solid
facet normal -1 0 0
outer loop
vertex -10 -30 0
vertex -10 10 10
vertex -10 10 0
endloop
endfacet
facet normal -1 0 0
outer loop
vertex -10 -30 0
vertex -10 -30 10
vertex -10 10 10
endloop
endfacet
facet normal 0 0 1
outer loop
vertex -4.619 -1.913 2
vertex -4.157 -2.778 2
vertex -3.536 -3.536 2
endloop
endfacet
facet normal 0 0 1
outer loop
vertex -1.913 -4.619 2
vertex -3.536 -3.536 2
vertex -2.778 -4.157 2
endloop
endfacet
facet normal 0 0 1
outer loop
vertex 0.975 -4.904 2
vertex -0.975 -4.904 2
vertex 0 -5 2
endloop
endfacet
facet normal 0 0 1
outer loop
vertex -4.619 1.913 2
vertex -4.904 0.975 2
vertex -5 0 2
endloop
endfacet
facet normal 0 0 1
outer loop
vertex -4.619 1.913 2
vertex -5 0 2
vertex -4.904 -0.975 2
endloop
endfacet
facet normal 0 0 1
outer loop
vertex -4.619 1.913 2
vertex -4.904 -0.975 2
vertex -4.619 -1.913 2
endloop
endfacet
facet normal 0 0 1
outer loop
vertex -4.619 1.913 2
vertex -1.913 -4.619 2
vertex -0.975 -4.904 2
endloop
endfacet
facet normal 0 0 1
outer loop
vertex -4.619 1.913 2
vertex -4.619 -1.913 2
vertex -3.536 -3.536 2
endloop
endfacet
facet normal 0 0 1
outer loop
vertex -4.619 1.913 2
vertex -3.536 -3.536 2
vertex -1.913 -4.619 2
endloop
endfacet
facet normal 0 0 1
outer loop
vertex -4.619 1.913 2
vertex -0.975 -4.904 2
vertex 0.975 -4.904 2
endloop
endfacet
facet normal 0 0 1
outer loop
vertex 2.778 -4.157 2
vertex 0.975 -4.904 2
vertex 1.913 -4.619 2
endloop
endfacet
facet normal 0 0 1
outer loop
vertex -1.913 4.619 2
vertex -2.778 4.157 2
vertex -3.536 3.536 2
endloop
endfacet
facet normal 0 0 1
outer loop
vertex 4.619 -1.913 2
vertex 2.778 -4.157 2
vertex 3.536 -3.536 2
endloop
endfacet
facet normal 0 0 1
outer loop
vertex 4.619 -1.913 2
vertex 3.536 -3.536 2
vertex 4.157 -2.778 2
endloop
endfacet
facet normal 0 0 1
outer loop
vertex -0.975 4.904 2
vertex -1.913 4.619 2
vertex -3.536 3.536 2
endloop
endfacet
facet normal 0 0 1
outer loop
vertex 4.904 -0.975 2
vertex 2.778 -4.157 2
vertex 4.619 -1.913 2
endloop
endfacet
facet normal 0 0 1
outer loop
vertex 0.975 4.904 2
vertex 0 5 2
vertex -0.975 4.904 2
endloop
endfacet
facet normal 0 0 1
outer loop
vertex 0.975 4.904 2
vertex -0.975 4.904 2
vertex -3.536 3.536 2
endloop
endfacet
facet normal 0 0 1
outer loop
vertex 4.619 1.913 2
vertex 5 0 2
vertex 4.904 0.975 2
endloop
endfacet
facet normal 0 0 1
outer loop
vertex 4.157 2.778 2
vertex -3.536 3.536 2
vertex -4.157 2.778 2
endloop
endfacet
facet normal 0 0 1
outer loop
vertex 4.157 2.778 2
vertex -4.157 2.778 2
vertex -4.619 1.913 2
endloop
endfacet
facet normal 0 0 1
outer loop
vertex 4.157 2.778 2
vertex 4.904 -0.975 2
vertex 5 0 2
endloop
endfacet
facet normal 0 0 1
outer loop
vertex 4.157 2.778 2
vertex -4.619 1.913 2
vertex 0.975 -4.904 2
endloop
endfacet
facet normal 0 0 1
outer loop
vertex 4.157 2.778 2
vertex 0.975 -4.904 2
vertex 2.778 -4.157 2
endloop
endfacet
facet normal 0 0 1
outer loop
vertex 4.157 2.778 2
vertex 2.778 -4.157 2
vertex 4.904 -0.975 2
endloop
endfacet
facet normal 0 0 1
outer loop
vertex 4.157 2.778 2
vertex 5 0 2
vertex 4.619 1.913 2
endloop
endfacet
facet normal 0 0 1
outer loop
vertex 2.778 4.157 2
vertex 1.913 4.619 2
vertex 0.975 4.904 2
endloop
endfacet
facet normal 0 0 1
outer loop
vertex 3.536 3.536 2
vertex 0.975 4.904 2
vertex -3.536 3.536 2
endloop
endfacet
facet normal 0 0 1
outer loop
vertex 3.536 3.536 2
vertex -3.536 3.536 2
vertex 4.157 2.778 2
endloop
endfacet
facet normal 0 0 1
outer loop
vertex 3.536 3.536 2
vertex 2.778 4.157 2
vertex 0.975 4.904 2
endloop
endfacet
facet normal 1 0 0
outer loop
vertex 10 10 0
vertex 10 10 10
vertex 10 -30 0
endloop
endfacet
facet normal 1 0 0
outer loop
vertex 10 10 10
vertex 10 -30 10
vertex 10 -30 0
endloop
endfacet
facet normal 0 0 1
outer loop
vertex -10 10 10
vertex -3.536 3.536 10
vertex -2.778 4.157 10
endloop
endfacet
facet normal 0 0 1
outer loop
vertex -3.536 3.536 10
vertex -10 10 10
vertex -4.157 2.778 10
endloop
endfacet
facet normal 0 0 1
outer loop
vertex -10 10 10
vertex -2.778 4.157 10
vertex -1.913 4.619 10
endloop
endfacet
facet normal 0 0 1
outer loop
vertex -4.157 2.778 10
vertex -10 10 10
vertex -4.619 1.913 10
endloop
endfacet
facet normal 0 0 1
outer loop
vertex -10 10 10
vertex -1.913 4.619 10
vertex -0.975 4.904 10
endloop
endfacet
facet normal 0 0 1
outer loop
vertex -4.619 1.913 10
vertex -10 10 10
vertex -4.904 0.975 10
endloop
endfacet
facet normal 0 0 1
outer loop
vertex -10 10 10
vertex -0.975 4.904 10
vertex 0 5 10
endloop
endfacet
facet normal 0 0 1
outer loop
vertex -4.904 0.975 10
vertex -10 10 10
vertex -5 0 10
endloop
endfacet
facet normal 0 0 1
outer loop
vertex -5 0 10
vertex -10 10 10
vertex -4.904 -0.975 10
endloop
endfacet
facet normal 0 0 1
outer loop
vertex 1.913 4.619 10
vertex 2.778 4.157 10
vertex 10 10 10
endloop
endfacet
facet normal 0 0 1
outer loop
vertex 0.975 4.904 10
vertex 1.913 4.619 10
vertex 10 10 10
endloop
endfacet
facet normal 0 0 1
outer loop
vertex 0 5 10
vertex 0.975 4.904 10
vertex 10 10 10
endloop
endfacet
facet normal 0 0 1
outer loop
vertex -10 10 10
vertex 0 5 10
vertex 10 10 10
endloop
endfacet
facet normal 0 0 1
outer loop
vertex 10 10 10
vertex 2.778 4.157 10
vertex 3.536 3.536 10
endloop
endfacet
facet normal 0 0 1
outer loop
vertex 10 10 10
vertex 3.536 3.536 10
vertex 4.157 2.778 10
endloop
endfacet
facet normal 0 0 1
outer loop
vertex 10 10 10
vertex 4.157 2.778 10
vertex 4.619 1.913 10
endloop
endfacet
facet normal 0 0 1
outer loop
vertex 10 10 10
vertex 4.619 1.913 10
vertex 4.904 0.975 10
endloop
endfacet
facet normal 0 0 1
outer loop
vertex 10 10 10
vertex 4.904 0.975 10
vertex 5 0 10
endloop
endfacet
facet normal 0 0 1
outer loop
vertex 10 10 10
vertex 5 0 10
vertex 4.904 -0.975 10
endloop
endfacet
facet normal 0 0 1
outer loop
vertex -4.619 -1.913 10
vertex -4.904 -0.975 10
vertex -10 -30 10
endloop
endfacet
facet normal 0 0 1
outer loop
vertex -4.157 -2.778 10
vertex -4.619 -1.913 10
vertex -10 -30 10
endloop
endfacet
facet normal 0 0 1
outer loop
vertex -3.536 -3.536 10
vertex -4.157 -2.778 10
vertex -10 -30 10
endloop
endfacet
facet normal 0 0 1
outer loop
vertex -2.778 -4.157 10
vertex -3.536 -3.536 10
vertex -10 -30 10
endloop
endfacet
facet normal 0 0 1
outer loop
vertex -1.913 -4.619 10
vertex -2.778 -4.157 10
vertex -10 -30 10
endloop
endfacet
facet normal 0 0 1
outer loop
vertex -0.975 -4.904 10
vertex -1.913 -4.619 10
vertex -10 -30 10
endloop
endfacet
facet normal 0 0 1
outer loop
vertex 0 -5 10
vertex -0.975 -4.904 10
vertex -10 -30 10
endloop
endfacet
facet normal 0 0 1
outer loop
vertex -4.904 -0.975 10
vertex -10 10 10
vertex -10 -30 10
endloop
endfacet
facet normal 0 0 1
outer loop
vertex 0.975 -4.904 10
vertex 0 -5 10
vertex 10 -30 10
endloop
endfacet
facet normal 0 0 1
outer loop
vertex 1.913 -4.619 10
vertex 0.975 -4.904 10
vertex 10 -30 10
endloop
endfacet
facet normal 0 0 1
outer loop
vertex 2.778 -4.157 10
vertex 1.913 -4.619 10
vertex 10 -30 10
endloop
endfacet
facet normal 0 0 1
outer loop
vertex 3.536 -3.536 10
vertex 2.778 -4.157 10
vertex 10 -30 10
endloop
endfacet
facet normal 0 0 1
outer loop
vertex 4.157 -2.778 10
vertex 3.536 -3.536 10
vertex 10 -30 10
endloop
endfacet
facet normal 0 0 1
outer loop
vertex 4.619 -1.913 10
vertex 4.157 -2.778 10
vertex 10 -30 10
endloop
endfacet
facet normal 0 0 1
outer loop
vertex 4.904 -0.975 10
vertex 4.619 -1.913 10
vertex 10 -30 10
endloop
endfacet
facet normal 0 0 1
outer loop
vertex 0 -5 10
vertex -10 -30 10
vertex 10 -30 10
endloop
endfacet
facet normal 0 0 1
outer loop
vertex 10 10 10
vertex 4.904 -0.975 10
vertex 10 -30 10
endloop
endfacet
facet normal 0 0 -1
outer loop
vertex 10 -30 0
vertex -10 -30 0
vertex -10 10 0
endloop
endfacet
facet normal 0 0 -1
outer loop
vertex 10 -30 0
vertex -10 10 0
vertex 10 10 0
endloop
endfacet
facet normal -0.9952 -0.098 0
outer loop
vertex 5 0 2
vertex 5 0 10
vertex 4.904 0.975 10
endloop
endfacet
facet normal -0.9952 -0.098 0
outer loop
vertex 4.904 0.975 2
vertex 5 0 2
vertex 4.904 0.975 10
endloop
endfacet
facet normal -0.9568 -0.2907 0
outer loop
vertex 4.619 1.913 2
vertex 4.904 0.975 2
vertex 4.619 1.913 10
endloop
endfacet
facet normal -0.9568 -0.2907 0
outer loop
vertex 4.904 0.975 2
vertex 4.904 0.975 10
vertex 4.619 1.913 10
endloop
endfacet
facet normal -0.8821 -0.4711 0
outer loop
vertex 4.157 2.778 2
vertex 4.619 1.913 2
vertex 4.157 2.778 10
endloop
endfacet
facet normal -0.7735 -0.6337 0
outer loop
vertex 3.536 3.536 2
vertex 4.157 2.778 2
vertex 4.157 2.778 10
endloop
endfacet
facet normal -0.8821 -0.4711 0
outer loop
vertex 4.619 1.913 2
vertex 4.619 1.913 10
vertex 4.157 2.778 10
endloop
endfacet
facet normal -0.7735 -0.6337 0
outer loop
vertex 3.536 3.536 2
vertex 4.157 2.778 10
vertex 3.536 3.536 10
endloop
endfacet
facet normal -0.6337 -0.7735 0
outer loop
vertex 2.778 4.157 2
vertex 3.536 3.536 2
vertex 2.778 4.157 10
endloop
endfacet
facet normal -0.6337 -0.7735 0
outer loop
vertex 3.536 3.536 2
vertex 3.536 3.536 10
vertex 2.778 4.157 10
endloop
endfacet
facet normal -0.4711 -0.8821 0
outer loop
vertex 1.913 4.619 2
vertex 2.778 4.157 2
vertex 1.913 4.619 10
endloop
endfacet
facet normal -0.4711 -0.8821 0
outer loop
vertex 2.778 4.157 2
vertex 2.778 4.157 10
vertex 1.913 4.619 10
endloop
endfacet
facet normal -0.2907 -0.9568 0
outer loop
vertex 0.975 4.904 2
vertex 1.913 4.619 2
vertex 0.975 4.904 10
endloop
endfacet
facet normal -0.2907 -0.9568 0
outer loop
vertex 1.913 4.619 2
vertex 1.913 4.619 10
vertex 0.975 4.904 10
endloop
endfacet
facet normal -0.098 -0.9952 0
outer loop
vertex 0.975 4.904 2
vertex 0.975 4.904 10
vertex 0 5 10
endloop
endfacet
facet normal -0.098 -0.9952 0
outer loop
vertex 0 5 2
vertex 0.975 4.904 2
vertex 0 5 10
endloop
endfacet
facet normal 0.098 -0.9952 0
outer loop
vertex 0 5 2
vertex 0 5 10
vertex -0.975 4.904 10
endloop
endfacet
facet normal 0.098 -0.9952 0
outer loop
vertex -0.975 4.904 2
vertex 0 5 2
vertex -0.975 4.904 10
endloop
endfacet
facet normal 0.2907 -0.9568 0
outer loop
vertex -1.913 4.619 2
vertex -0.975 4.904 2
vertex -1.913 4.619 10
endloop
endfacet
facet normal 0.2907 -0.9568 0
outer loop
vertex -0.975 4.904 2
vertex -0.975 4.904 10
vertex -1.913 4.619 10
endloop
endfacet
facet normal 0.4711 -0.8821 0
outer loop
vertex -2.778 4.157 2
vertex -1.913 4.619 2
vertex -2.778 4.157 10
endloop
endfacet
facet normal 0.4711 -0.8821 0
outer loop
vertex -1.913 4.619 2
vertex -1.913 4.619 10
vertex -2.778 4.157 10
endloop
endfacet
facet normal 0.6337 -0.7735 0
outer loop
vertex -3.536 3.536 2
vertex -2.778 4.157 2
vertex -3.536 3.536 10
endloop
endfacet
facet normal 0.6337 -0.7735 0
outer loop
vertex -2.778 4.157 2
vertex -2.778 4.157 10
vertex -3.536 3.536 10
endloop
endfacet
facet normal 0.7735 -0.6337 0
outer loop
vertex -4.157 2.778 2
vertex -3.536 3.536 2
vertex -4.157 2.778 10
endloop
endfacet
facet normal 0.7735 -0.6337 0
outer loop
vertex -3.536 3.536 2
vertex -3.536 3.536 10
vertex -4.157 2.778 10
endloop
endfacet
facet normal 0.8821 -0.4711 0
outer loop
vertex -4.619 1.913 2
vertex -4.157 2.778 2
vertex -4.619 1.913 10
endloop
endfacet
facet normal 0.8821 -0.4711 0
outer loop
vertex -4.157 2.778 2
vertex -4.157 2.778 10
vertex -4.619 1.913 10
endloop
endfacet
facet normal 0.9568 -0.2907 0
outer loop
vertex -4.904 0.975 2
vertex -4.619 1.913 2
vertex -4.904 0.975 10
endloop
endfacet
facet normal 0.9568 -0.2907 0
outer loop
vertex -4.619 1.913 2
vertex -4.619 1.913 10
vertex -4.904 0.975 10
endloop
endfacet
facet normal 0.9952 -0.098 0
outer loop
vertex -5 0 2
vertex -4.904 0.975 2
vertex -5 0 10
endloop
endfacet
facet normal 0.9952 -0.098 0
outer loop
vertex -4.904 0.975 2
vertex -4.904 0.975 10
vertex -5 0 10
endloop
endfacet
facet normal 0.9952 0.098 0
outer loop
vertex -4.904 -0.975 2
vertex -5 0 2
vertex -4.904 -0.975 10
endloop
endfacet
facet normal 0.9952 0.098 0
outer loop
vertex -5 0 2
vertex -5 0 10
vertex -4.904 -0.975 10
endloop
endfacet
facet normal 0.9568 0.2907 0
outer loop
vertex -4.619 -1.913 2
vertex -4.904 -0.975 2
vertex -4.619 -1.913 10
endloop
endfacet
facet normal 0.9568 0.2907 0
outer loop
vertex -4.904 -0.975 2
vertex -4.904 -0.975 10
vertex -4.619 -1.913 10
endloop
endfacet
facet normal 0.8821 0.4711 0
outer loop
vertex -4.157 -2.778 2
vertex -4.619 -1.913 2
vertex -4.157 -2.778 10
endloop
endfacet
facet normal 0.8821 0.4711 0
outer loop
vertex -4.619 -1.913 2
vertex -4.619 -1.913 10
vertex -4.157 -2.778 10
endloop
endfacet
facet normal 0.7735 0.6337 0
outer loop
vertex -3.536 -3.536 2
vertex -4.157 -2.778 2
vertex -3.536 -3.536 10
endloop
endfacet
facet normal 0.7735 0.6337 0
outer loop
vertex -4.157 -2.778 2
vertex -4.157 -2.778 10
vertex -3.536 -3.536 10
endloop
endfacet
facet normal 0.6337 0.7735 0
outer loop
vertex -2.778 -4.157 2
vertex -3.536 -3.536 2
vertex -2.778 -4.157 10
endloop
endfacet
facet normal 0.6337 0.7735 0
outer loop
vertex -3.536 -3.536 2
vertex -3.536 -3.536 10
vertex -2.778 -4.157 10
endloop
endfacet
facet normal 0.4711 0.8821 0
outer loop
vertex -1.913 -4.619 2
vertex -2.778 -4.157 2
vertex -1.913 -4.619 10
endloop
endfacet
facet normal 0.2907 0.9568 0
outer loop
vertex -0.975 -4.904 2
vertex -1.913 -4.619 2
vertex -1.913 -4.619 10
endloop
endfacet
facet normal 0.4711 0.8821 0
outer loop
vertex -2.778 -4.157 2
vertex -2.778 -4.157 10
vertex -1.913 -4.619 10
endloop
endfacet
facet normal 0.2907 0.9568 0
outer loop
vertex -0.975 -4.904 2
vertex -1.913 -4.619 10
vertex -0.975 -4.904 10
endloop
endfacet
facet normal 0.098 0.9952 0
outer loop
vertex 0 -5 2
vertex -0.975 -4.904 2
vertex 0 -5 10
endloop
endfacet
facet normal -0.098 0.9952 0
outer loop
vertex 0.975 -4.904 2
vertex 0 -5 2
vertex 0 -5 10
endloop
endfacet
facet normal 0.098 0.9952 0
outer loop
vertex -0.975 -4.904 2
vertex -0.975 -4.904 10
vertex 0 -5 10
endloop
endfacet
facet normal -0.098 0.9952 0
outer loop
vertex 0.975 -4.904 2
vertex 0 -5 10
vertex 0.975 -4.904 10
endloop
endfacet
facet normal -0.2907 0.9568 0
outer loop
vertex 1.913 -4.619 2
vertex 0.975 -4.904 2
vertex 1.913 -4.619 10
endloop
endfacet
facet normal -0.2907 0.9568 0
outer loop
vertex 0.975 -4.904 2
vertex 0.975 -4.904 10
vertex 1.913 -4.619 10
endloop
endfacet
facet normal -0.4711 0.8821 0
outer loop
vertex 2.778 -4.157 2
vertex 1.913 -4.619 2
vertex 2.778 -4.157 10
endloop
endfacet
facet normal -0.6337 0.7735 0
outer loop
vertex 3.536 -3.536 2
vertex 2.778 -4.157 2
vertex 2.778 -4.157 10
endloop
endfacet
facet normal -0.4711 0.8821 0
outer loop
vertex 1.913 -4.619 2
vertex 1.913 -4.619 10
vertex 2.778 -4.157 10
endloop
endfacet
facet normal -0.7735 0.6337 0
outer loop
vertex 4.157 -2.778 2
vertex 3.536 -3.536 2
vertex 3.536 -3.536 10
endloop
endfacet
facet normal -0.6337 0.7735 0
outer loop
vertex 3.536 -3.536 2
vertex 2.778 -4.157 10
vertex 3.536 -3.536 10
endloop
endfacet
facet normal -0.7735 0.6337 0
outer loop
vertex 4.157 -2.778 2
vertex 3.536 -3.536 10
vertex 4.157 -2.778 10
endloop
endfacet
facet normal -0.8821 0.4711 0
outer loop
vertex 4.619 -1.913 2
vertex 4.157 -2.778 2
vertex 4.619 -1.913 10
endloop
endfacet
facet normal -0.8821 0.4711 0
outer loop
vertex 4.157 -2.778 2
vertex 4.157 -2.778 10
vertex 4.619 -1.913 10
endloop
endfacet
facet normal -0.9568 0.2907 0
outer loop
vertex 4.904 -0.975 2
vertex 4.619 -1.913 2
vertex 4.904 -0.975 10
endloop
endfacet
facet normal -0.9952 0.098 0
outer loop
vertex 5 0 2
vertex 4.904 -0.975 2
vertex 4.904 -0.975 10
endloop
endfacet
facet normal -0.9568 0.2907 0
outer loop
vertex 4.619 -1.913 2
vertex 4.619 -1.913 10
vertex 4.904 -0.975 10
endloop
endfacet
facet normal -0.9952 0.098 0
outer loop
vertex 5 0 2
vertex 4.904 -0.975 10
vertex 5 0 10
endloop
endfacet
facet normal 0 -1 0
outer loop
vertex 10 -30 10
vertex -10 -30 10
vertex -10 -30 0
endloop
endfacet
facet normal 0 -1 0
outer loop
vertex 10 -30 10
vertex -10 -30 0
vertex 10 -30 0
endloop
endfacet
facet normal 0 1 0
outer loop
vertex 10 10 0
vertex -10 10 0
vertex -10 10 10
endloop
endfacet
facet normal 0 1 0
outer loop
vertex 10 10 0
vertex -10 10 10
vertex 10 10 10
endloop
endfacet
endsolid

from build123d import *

# Parameters (mm, degrees)
F0_W      = 20
F0_H      = 10
F1_DEPTH  = 30
F1_FACE_W = 20
F1_FACE_H = 10
F2_DEPTH  = 10
F4_R      = 5
F5_DEPTH  = 8


with BuildPart() as f1:
    # F0 (on Front) → F1 (new body)
    with BuildSketch(Plane.XZ):
        with Locations((0, 5)):
            Rectangle(F0_W, F0_H)
    extrude(amount=F1_DEPTH)

    # F1_face (on face) → F2 (join)
    with BuildSketch(Plane(origin=(0, 0, 5), x_dir=(1, 0, 0), z_dir=(0, 1, 0))):
        Rectangle(F1_FACE_W, F1_FACE_H)
    extrude(amount=F2_DEPTH)

    # F4 (on face) → F5 (cut)
    with BuildSketch(Plane.XY.offset(10)):
        Circle(F4_R)
    extrude(amount=-F5_DEPTH, mode=Mode.SUBTRACT)


solid = f1.part
